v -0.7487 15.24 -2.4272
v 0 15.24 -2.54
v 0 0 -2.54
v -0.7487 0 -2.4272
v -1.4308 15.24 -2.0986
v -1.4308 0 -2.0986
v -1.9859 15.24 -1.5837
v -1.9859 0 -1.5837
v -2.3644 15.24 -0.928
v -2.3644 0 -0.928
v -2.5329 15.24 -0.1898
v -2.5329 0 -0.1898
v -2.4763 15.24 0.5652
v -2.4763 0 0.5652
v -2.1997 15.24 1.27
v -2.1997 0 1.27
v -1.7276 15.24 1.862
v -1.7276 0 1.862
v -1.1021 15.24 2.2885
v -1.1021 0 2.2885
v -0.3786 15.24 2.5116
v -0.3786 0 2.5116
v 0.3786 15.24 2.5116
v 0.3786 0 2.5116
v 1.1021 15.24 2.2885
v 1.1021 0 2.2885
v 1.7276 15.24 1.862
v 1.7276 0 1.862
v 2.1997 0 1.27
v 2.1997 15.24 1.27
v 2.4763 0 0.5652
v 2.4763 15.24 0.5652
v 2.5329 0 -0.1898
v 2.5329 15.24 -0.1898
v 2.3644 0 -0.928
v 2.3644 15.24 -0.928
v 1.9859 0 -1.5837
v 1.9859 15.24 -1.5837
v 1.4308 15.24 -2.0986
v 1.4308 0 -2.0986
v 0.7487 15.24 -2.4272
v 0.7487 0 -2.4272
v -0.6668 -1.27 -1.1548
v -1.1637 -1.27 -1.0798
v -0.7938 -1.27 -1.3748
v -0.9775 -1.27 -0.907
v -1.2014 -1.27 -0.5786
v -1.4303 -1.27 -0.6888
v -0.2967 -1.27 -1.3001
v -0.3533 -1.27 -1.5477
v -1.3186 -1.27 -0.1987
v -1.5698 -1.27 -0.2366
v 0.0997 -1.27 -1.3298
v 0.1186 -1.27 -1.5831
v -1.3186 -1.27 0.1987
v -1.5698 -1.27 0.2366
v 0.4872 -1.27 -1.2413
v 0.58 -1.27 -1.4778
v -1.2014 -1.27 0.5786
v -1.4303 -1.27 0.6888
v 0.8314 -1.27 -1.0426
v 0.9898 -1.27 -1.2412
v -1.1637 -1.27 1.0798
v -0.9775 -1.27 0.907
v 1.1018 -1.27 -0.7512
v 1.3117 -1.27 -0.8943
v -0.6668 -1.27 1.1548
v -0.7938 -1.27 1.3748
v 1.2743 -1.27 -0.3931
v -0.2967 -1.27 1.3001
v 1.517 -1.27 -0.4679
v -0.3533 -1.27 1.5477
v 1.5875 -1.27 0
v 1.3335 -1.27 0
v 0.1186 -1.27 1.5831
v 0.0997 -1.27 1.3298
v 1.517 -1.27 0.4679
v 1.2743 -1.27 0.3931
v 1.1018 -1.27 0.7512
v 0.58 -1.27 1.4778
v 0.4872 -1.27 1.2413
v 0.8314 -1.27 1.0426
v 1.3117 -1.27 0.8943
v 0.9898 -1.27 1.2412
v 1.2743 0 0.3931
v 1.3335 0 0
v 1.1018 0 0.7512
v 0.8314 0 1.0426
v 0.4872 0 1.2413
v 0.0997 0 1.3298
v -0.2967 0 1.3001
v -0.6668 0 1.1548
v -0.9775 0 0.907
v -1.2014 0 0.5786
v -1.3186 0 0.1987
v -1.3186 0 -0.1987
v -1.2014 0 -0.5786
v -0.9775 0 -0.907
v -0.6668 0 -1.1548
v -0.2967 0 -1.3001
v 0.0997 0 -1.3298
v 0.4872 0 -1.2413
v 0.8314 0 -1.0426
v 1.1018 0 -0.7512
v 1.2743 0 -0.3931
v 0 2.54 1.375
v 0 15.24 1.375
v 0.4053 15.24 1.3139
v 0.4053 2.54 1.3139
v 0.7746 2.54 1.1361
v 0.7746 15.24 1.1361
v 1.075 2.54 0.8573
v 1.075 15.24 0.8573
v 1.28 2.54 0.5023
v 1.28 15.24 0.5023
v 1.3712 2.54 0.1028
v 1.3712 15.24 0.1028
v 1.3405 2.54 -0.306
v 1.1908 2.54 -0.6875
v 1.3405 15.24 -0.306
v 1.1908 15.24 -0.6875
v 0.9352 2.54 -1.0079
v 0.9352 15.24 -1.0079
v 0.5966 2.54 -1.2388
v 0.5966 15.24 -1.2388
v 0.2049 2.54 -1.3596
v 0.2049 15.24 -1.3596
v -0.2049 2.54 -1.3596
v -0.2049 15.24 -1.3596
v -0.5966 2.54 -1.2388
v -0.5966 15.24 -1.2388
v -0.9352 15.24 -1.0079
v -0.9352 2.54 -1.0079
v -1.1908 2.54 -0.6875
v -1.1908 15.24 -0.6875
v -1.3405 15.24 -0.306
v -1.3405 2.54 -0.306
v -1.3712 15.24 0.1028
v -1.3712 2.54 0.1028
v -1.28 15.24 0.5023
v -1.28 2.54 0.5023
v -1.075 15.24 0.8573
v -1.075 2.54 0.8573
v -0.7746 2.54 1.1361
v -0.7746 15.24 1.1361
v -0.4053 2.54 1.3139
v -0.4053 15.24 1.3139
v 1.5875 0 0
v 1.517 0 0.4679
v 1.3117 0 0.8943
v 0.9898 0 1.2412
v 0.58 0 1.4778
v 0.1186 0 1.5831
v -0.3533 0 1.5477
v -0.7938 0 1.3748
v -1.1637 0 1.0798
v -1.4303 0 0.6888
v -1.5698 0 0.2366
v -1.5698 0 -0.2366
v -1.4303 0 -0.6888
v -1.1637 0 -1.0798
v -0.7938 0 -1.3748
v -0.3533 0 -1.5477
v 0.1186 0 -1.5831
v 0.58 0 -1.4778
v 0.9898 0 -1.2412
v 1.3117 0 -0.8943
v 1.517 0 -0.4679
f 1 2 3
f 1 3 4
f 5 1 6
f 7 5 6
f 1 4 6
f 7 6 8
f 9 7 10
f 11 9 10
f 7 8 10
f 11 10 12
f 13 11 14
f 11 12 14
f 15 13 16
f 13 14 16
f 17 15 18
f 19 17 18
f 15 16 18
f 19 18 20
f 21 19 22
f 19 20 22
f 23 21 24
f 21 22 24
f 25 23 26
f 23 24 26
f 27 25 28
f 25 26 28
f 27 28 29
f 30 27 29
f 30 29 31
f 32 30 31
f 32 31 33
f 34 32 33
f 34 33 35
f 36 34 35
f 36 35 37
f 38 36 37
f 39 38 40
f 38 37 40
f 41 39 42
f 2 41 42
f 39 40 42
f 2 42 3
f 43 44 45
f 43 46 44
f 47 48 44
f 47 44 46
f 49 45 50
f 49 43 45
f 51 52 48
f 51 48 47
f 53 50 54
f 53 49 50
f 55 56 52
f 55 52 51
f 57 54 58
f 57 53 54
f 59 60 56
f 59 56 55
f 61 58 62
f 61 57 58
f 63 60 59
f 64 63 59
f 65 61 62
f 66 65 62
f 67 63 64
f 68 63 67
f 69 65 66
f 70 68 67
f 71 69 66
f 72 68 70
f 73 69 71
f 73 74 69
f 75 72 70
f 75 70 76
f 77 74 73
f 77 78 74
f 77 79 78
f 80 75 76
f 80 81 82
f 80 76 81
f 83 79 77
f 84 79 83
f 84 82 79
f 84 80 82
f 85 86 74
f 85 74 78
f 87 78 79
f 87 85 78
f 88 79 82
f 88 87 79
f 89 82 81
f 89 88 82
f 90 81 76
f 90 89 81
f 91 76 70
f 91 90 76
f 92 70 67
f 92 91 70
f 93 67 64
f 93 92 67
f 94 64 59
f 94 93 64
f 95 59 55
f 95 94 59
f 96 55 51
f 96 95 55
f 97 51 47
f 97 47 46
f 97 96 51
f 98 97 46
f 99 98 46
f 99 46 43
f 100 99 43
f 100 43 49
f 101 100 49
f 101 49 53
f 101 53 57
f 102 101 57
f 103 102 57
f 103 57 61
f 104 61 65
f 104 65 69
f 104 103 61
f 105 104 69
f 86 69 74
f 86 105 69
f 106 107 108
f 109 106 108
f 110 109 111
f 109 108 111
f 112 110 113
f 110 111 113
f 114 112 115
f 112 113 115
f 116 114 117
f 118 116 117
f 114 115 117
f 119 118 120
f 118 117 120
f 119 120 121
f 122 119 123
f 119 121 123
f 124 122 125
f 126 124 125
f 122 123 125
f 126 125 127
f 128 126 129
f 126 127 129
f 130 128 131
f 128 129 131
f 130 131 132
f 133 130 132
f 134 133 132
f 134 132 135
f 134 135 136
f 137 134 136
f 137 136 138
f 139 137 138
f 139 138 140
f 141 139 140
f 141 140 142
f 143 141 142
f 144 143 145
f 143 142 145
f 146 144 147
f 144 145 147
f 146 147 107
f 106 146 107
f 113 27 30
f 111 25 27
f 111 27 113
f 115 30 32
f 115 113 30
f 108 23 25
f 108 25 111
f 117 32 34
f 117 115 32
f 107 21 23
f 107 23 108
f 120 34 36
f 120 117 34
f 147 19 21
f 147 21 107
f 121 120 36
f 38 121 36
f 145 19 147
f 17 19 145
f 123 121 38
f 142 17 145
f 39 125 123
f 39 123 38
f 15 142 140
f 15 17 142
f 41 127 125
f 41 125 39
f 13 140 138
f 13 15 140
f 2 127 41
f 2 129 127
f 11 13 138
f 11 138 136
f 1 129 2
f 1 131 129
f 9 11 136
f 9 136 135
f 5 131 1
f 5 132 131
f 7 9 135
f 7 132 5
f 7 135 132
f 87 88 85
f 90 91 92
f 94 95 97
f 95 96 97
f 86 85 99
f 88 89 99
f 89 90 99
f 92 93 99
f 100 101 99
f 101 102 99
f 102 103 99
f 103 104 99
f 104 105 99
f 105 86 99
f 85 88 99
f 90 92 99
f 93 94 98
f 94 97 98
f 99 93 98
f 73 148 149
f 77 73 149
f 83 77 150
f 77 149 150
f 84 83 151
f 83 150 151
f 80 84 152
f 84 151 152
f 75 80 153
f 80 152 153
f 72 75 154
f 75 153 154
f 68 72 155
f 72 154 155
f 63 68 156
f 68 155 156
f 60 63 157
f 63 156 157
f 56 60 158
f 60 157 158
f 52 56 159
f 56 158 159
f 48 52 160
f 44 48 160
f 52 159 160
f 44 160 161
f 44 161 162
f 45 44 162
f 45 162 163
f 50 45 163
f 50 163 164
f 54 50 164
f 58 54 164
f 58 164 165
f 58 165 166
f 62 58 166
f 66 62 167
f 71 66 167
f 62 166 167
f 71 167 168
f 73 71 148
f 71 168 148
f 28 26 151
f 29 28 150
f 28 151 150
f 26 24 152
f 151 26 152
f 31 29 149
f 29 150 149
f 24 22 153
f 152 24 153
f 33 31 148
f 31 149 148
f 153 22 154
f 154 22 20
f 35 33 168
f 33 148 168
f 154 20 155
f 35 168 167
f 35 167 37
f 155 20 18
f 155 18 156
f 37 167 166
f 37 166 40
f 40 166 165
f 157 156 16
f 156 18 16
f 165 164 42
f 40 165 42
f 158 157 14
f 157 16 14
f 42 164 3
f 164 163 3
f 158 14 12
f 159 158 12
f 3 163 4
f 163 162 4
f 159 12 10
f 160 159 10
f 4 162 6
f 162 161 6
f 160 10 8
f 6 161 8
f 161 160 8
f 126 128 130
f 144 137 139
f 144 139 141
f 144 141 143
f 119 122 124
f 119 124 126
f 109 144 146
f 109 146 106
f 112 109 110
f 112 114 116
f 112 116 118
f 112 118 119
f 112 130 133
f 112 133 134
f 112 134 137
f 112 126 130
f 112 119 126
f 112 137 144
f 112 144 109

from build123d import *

# Parameters (mm, degrees)
SKETCH1_R           = 2.54
BOSS_EXTRUDE1_DEPTH = 15.24
SKETCH2_R           = 1.375
CUT_EXTRUDE1_DEPTH  = 12.7
SKETCH4_R           = 1.5875
SKETCH4_R_2         = 1.3335
EXTRUDE_THIN1_DEPTH = 1.27


with BuildPart() as part:
    # Sketch1 → Boss-Extrude1 (new body)
    with BuildSketch(Plane(origin=(0, 0, 0), x_dir=(1, 0, 0), z_dir=(0, 1, 0))):
        with Locations(Location((0, 0, 0), (0, 0, 90))):
            Circle(SKETCH1_R)
    extrude(amount=BOSS_EXTRUDE1_DEPTH)

    # Sketch2 → Cut-Extrude1 (cut)
    with BuildSketch(Plane(origin=(0, 15.24, 0), x_dir=(1, 0, 0), z_dir=(0, 1, 0))):
        with Locations(Location((0, 0, 0), (0, 0, 270))):
            Circle(SKETCH2_R)
    extrude(amount=-CUT_EXTRUDE1_DEPTH, mode=Mode.SUBTRACT)

    # Sketch4 → Extrude-Thin1 (add)
    with BuildSketch(Plane.XZ):
        Circle(SKETCH4_R)
        Circle(SKETCH4_R_2, mode=Mode.SUBTRACT)
    extrude(amount=EXTRUDE_THIN1_DEPTH)


solid = part.part
